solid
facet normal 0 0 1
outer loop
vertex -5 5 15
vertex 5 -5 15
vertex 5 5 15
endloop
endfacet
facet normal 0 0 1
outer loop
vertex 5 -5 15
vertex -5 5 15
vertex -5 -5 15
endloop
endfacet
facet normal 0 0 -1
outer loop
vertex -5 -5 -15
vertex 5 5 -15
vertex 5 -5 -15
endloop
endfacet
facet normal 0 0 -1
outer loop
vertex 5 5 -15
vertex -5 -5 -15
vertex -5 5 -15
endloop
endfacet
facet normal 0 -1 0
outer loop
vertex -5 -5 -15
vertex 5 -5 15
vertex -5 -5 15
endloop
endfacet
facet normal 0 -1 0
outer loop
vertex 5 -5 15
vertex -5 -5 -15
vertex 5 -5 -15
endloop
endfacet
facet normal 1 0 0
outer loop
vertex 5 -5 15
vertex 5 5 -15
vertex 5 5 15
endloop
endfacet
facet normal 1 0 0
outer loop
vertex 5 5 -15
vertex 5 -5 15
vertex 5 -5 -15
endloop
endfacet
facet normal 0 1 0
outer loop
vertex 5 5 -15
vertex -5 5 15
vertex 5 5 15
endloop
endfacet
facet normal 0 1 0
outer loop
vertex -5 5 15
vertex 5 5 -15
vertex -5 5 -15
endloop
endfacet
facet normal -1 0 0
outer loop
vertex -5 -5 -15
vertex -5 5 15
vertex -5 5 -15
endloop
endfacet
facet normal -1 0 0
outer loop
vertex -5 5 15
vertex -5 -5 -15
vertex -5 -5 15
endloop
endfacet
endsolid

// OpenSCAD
//universal rod mount


id = 25;
od = id+3;
height = 30;

screw = "M3x10";

screw_block_width = od*0.25;

zblock_width = 10;
zblock_depth = 10;
ziptie_w = 5;
ziptie_h = 2; 

module zblock() {
    cube([zblock_depth, zblock_width, height], center=true);
}

module main_cylinder() {
  //difference() {
    { 
        cylinder(h=height, d=od, center=true);
        translate([0.5*od, 0, 0]) cube([zblock_depth, zblock_width, height], center=true);
    }
    //cylinder(h=height, d=id, center=true);
 // }
}


//main_cylinder();
zblock();
